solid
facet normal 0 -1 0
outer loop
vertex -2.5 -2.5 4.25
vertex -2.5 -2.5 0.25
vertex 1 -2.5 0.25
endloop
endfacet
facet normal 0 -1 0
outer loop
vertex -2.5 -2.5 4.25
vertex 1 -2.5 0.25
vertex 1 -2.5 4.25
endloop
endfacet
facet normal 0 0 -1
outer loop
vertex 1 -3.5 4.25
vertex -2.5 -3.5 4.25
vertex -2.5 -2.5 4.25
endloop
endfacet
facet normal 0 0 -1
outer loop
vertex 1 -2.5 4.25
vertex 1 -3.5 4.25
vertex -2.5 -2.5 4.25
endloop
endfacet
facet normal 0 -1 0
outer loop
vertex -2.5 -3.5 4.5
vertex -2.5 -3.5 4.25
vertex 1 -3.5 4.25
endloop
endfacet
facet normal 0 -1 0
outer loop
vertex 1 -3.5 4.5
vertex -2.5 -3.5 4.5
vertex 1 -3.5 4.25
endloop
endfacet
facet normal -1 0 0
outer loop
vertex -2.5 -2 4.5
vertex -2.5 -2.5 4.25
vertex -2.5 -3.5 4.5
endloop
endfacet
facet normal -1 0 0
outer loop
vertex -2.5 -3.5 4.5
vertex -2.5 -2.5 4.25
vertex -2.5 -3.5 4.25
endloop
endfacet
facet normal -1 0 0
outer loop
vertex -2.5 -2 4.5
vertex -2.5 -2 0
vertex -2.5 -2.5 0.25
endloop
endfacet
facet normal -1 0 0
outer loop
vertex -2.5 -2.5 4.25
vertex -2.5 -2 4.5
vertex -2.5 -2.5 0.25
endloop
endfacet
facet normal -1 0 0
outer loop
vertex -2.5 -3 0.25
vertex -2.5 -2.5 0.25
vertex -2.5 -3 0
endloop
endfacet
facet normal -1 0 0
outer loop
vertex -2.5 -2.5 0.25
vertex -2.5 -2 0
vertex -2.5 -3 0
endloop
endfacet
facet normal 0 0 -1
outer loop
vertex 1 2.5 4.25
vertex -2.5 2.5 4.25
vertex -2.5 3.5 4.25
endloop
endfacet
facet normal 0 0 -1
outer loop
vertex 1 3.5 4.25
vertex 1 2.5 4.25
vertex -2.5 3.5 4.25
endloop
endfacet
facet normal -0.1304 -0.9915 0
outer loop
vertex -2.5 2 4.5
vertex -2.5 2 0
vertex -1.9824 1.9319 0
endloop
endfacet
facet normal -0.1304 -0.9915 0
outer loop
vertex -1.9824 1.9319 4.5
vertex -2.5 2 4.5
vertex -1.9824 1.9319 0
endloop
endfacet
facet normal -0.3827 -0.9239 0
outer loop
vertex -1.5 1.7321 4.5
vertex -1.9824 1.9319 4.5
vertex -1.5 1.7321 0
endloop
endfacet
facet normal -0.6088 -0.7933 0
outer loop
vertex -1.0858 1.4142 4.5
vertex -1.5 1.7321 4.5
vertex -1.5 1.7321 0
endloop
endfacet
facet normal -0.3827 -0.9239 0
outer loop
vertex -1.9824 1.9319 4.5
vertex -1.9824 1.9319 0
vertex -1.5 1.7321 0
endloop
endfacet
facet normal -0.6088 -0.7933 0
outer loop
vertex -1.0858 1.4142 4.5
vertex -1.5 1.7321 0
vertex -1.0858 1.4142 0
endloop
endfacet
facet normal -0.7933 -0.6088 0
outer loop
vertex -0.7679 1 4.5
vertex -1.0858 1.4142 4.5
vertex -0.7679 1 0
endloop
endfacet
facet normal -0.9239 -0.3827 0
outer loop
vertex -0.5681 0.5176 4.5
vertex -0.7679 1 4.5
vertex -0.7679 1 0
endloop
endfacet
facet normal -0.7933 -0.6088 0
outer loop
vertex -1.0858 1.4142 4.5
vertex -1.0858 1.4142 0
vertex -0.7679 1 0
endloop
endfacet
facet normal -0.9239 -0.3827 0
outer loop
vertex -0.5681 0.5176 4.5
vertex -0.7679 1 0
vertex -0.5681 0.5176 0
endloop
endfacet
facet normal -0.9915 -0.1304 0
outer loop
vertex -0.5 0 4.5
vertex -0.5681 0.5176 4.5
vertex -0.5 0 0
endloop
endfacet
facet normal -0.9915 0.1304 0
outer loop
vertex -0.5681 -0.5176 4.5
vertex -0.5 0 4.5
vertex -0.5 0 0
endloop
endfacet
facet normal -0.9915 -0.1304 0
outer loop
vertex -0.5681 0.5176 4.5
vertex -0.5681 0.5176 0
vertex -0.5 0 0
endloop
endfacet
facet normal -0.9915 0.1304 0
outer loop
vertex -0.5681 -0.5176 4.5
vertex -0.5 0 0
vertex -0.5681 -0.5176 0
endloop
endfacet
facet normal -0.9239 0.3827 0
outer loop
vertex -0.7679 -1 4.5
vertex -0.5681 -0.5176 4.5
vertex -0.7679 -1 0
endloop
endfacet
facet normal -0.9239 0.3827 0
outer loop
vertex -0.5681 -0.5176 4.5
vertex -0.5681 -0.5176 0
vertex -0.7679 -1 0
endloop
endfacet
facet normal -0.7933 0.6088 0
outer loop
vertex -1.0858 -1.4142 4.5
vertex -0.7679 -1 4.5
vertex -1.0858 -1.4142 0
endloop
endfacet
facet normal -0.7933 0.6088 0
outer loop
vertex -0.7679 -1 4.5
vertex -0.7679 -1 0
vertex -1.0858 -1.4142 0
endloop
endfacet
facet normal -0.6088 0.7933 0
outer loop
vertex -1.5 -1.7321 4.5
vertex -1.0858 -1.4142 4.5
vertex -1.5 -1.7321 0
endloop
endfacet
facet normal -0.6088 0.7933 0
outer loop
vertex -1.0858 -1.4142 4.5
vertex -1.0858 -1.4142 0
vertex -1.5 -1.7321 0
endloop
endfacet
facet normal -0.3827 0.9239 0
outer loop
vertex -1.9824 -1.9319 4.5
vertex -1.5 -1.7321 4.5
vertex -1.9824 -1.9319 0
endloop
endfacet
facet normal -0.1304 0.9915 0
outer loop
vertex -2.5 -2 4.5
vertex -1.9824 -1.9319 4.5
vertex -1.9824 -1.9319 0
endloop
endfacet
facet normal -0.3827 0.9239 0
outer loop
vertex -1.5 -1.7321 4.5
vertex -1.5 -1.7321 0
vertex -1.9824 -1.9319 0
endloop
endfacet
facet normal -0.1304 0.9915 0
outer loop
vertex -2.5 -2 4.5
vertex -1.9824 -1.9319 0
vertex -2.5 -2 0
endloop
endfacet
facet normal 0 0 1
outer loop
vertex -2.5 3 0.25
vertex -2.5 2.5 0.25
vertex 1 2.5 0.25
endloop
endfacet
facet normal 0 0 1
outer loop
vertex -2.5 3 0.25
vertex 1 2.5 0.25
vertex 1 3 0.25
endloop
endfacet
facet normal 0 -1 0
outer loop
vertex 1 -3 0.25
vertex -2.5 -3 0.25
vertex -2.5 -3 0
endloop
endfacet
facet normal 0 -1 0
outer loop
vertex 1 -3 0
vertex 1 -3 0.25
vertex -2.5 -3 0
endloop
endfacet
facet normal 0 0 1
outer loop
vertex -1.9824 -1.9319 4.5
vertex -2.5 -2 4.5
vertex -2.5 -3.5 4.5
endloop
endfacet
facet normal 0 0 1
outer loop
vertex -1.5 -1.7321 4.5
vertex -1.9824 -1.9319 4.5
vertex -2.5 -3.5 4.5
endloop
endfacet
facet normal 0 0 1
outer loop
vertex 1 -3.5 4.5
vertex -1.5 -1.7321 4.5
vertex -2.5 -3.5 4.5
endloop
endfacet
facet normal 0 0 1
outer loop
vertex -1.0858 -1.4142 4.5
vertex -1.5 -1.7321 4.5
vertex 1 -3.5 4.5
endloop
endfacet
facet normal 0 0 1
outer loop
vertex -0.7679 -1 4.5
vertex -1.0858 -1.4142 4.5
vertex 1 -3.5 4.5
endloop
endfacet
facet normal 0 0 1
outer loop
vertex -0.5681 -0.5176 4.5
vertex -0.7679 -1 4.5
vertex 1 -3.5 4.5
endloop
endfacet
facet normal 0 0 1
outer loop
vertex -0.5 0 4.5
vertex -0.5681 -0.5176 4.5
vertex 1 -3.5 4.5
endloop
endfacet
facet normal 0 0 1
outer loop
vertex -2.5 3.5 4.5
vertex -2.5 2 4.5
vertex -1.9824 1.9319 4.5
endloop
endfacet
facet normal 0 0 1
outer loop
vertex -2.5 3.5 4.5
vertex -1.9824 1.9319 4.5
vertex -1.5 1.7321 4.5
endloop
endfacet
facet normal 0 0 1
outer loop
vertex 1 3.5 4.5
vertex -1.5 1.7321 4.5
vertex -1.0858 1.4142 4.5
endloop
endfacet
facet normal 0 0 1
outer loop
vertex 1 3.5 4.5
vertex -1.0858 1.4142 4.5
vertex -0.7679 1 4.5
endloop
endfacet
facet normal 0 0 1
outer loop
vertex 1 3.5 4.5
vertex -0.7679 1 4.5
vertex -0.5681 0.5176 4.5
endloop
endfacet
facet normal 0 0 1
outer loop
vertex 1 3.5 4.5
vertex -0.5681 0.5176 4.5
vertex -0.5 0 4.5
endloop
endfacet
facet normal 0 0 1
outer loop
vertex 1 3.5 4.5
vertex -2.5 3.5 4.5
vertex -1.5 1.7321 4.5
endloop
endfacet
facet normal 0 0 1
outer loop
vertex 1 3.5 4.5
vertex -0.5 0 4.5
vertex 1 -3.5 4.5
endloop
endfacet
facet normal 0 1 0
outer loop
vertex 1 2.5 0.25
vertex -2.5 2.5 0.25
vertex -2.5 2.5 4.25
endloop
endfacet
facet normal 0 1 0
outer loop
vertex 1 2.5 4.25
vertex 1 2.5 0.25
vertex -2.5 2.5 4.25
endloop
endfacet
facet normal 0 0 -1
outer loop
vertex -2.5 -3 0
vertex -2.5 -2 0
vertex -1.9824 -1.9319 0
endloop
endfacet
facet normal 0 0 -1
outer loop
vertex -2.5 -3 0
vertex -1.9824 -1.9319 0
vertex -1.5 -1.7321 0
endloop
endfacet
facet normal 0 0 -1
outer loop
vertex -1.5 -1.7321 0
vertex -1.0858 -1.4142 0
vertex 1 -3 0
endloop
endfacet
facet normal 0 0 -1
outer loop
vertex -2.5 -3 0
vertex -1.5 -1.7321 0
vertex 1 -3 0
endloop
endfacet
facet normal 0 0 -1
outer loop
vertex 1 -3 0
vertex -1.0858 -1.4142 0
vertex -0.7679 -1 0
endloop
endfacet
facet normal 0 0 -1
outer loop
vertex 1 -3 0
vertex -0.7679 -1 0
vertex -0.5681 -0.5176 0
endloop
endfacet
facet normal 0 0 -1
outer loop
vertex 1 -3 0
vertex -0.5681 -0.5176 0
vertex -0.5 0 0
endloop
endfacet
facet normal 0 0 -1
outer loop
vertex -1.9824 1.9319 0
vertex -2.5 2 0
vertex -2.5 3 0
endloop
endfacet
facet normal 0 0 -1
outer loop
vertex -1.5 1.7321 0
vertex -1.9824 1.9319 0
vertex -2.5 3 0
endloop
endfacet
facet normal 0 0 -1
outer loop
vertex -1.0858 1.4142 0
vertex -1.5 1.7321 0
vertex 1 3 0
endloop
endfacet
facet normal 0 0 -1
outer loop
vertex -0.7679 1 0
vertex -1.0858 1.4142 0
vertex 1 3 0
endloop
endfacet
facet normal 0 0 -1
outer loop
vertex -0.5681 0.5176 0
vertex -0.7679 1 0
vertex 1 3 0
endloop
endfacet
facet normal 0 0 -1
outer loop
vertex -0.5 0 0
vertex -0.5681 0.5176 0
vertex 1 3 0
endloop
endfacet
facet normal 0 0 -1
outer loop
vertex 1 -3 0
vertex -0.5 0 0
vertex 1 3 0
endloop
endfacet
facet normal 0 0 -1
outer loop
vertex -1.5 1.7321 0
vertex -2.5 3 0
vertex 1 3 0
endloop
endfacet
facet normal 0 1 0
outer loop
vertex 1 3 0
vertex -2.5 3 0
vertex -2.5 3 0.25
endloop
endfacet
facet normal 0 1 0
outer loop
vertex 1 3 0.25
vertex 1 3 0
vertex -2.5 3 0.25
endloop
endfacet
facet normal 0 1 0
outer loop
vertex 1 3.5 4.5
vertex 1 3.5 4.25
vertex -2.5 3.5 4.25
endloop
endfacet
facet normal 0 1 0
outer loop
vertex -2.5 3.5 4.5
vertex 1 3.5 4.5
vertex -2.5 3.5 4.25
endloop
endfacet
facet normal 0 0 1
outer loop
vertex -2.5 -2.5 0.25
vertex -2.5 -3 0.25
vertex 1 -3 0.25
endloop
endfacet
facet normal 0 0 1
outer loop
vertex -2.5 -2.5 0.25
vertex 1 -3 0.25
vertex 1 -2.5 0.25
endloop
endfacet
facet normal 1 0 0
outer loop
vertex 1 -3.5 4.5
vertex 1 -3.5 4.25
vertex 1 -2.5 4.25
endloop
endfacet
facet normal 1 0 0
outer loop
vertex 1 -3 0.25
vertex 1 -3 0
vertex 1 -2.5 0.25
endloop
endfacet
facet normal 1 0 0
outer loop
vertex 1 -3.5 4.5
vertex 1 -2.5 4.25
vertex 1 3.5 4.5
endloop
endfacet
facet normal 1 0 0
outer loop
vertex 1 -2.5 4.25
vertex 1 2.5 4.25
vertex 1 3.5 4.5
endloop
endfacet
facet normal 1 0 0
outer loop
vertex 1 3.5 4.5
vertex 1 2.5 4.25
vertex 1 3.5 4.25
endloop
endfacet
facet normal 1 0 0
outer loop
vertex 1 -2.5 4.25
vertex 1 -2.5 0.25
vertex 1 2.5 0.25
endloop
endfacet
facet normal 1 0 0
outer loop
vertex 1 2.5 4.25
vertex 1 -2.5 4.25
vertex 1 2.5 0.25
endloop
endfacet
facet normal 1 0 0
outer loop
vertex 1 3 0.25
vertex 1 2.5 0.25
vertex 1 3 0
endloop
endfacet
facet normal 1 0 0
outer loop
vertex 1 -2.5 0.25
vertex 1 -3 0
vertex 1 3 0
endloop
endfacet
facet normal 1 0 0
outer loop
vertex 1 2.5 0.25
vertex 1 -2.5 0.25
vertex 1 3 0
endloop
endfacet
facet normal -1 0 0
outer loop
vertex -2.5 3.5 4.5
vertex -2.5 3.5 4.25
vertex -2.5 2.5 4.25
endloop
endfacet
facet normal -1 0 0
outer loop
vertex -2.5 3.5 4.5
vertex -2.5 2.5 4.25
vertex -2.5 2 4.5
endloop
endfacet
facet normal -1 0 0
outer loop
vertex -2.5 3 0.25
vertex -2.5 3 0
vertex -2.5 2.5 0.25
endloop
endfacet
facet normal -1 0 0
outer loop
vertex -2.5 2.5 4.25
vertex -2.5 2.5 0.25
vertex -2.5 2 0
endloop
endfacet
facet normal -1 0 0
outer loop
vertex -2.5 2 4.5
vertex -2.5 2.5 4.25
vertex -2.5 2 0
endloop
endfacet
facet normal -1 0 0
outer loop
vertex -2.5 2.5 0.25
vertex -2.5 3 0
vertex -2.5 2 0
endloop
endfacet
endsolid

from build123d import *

# Parameters (mm, degrees)
BOSS_EXTRU_1_DEPTH      = 4.5
ESQUISSE2_W             = 4
ESQUISSE2_H             = 0.5
ENL_V_MAT_EXTRU_2_DEPTH = 7.68954408


with BuildPart() as part:
    # Esquisse1 → Boss.-Extru.1 (new body)
    with BuildSketch(Plane.XY):
        with BuildLine():
            Line((1, 3.5), (-2.5, 3.5))
            Line((-2.5, 3.5), (-2.5, 2))
            ThreePointArc((-2.5, 2), (-0.5, 0), (-2.5, -2))
            Line((-2.5, -2), (-2.5, -3.5))
            Line((-2.5, -3.5), (1, -3.5))
            Line((1, -3.5), (1, 3.5))
        make_face()
    extrude(amount=BOSS_EXTRU_1_DEPTH)

    # Esquisse2 → Enlèv. mat.-Extru.2 (cut, through all)
    with BuildSketch(Plane.ZY.offset(2.5)):
        Polygon((4.25, 3.5), (0, 3.5), (0, 3), (0.25, 3), (4.25, 3), align=None)
        with Locations((2.25, 2.75)):
            Rectangle(ESQUISSE2_W, ESQUISSE2_H)
        with Locations((2.25, -2.75)):
            Rectangle(ESQUISSE2_W, ESQUISSE2_H)
        Polygon((4.25, -3), (0.25, -3), (0, -3), (0, -3.5), (4.25, -3.5), align=None)
    extrude(amount=-ENL_V_MAT_EXTRU_2_DEPTH, mode=Mode.SUBTRACT)


solid = part.part
